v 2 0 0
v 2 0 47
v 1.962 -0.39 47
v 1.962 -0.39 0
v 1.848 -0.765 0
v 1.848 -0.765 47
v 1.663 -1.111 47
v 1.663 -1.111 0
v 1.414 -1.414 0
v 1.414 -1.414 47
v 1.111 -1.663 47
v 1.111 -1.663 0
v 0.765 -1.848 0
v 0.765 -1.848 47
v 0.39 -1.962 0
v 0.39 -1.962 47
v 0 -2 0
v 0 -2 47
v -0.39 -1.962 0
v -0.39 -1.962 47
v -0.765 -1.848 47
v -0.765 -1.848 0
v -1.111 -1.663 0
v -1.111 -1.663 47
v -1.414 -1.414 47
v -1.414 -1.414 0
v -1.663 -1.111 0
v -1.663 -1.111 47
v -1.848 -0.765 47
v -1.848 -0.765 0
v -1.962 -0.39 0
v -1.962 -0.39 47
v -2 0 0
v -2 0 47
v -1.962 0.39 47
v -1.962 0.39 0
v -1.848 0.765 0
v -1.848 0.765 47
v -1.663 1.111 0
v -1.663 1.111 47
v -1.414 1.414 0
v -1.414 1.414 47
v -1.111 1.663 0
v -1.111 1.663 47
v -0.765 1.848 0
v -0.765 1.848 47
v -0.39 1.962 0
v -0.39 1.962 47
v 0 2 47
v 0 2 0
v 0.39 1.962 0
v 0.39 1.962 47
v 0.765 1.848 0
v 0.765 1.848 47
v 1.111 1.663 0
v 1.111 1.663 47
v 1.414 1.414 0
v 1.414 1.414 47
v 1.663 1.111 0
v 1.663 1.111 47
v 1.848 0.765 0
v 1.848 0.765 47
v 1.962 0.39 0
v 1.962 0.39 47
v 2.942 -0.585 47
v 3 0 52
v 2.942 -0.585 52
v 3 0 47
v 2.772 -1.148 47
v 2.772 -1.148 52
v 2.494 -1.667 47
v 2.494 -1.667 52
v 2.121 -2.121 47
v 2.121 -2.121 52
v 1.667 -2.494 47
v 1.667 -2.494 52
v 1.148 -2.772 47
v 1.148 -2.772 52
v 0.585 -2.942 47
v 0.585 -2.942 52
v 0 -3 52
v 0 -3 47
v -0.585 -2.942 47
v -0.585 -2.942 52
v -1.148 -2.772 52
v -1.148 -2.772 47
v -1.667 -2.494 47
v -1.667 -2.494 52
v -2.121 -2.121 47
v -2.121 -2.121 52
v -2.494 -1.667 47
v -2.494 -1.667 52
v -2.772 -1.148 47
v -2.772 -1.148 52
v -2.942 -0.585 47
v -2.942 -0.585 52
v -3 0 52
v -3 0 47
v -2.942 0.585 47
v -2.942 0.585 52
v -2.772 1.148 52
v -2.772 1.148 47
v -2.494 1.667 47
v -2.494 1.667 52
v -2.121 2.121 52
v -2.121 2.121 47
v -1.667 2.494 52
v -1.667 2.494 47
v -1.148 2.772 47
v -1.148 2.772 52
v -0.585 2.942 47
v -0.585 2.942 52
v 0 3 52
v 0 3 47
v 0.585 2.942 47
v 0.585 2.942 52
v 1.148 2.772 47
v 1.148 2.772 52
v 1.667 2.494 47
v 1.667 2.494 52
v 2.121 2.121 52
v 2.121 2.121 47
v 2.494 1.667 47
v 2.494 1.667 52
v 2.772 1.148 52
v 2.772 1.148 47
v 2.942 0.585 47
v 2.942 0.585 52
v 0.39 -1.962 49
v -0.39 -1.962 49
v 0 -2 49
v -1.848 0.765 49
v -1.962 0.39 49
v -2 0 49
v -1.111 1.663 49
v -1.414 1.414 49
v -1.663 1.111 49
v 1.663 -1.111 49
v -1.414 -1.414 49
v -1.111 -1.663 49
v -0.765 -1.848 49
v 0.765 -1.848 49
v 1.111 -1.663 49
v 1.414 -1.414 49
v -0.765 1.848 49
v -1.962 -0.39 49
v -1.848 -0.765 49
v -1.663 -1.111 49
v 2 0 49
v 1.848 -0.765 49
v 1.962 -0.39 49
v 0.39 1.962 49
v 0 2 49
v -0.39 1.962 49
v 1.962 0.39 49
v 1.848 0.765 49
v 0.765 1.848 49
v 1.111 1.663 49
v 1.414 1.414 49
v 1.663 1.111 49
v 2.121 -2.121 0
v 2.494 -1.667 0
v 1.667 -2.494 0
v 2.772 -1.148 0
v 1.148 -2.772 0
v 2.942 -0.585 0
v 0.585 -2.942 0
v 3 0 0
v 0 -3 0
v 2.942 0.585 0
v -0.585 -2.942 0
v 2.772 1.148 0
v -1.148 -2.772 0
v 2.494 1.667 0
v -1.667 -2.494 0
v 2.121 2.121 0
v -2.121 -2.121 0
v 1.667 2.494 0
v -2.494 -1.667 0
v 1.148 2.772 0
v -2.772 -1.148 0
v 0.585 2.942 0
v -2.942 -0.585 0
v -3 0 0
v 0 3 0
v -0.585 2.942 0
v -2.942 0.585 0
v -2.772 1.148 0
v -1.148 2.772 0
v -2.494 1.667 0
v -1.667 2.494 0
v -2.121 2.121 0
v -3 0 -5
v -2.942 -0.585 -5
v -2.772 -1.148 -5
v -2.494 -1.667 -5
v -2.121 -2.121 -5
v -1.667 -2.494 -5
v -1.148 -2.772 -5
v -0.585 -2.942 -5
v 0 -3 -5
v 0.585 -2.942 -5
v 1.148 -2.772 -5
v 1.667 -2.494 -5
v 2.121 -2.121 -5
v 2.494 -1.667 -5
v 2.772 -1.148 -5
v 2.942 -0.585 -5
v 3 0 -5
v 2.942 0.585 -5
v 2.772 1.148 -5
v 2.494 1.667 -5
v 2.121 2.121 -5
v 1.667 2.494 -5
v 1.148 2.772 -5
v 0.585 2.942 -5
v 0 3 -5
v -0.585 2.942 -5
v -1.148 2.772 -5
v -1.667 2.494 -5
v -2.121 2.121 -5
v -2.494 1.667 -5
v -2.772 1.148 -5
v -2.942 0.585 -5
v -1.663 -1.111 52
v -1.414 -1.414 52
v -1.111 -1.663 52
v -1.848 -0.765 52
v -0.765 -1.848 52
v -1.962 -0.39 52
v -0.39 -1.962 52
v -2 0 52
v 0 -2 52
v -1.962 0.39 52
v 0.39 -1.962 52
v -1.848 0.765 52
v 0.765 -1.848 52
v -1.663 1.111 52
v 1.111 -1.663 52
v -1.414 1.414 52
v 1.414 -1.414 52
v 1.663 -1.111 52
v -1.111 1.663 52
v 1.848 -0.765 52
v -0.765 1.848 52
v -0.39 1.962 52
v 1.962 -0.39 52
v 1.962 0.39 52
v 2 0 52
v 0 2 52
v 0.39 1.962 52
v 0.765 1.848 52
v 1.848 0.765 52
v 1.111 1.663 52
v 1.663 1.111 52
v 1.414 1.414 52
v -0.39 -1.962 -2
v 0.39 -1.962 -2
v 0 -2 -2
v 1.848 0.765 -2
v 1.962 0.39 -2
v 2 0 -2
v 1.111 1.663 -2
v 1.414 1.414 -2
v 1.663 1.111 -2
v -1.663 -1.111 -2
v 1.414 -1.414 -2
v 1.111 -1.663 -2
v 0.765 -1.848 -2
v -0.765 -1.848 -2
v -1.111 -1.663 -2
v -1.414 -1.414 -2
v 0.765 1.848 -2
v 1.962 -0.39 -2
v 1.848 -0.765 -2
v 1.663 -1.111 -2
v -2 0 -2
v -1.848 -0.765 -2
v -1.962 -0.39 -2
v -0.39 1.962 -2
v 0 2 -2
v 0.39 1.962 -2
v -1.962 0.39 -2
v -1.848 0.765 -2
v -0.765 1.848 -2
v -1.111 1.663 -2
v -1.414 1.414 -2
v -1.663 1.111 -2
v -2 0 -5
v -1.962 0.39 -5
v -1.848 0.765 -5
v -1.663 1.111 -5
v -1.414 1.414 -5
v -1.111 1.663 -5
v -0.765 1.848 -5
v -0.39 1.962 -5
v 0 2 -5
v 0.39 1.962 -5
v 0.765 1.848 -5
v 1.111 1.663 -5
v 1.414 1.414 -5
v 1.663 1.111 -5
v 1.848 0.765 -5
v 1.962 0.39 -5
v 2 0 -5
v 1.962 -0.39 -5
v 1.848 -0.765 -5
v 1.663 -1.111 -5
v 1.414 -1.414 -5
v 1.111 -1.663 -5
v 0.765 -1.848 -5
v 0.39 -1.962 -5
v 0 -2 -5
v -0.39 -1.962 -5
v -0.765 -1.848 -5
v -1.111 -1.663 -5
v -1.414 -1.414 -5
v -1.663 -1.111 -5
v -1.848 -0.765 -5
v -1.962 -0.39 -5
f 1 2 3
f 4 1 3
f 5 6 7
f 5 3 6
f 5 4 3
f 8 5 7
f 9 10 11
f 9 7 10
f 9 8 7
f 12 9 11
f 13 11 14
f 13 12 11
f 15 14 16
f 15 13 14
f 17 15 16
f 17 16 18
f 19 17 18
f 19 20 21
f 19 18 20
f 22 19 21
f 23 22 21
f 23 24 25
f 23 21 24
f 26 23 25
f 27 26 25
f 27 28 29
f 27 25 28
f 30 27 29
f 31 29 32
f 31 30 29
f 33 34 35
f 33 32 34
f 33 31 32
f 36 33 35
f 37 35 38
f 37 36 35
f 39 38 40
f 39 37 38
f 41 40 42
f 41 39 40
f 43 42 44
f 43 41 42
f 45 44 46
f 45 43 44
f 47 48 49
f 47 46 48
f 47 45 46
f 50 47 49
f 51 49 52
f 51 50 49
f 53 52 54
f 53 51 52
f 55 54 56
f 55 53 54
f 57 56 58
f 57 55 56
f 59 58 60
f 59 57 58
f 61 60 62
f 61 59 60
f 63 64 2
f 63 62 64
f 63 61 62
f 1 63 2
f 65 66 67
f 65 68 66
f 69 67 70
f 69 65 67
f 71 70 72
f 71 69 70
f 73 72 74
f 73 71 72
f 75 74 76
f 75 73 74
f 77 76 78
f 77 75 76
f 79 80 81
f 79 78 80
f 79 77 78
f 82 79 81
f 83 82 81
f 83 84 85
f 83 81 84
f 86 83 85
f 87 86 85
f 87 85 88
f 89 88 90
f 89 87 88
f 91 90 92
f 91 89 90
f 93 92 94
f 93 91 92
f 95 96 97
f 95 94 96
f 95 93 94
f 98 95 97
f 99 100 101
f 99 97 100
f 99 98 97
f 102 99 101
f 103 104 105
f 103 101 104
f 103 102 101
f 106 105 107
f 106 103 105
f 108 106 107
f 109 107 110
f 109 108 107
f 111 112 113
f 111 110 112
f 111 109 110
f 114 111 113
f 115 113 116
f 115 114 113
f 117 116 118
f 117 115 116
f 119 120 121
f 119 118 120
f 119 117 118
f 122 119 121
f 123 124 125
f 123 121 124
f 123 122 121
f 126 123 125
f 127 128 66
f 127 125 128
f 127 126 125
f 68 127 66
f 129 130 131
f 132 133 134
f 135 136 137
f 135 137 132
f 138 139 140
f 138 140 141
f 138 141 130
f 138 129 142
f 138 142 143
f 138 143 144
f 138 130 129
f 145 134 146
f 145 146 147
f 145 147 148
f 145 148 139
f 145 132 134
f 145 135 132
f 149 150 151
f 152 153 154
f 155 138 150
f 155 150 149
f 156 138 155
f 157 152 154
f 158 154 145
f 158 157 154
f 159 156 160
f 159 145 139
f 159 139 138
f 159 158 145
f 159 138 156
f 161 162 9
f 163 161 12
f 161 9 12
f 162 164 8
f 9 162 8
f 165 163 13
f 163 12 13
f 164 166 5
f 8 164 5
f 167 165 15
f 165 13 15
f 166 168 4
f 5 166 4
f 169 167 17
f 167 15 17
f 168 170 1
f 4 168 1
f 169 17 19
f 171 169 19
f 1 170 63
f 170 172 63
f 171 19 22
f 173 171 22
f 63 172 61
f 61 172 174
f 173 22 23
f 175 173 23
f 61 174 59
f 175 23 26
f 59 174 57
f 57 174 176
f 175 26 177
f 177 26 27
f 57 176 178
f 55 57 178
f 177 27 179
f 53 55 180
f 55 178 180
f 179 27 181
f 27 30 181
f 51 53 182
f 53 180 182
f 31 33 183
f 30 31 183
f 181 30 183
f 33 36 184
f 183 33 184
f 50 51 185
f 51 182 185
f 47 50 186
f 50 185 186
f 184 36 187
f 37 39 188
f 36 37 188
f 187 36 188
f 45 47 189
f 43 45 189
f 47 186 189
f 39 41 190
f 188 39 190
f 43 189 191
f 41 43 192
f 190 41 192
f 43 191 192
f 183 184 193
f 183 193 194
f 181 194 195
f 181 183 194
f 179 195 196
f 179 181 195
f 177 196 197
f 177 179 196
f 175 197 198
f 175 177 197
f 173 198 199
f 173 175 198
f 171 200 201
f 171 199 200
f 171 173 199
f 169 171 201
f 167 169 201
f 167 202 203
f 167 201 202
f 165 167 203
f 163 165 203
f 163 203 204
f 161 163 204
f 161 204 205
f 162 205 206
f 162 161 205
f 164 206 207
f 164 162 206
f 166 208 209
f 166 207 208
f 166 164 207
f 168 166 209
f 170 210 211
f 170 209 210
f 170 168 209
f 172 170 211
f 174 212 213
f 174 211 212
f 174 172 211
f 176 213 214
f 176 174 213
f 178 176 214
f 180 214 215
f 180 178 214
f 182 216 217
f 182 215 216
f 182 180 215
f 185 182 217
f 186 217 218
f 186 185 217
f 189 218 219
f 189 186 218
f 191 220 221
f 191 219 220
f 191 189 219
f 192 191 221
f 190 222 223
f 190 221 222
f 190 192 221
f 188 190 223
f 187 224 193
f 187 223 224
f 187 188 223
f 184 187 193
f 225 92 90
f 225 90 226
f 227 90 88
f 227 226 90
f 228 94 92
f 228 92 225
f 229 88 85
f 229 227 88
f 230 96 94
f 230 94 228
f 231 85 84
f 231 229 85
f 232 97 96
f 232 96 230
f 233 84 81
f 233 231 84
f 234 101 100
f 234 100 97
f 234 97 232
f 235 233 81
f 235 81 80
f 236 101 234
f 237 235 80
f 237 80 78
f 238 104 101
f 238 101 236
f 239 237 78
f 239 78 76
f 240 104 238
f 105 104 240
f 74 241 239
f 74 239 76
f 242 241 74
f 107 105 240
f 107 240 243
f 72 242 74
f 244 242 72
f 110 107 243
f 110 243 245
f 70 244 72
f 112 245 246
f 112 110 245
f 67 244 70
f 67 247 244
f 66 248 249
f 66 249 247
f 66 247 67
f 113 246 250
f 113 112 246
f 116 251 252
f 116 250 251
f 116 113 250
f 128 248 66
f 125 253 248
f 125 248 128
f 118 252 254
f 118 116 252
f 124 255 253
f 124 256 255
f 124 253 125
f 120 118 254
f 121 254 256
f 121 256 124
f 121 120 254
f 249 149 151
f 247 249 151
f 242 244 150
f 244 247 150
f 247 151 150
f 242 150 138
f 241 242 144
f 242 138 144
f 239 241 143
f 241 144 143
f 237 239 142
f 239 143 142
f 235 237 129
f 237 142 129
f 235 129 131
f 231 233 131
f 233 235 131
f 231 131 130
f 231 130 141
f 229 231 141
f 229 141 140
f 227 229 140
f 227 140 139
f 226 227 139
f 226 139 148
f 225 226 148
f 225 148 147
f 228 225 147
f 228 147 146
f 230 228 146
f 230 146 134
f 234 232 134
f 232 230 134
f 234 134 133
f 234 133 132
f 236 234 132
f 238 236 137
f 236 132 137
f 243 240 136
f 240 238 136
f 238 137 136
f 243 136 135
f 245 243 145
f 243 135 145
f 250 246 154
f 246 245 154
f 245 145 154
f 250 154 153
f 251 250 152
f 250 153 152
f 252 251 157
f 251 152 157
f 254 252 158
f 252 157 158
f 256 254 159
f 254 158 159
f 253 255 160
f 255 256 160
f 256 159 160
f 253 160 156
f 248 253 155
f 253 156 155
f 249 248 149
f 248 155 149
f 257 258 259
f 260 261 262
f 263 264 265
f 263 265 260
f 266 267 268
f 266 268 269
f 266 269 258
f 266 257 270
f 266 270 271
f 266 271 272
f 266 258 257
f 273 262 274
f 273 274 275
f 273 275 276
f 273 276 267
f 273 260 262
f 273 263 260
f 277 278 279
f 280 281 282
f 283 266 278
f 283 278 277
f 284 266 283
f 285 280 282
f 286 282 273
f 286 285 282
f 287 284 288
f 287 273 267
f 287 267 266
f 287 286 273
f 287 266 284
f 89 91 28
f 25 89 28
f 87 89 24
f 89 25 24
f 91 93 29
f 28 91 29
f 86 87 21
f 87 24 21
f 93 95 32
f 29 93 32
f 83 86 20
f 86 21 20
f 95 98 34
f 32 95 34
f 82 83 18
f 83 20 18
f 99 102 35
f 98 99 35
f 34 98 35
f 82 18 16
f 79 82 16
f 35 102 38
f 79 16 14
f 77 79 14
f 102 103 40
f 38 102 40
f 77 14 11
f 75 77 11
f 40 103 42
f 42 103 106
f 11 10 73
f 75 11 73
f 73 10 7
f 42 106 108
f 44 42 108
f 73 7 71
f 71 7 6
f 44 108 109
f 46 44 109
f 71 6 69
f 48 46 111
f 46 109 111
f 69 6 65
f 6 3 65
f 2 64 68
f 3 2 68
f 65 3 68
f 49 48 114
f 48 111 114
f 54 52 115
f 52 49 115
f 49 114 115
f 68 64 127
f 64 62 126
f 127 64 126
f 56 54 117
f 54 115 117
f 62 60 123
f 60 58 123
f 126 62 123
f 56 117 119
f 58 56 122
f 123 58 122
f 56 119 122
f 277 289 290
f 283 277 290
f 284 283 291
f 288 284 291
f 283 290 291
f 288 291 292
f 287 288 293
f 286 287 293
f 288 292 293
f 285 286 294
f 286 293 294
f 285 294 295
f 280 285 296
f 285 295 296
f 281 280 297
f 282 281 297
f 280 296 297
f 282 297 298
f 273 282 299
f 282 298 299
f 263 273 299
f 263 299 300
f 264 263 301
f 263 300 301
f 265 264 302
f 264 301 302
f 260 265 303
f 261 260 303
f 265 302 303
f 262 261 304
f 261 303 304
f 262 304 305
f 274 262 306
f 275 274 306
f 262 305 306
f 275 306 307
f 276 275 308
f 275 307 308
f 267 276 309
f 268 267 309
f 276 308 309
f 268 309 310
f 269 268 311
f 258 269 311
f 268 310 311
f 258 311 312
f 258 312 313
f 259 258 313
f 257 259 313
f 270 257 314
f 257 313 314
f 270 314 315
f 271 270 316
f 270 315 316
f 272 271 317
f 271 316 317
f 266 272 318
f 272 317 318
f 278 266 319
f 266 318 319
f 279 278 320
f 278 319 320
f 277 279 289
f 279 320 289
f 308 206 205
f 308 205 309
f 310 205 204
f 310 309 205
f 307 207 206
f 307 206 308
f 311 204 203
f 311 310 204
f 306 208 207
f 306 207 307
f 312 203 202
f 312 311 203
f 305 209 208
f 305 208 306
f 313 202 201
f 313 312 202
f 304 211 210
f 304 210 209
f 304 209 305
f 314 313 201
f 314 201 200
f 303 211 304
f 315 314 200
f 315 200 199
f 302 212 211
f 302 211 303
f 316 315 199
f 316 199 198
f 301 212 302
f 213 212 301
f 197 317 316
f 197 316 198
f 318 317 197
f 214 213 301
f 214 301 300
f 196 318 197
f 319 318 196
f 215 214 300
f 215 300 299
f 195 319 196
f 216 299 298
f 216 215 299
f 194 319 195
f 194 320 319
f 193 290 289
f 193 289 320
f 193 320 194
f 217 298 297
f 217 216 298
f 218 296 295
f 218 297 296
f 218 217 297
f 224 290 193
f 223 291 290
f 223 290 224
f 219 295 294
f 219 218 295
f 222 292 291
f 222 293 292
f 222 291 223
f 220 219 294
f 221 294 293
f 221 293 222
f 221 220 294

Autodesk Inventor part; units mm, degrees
ref_plane "YZ Plane" through (0, 0, 0) normal (1, 0, 0) x (0, 1, 0)
ref_plane "XZ Plane" through (0, 0, 0) normal (0, 1, 0) x (-1, 0, 0)
ref_plane "XY Plane" through (0, 0, 0) normal (0, 0, 1) x (1, 0, 0)
sketch "Sketch1" plane through (0, 0, 0) normal (0, 0, 1) x (1, 0, 0)
  circle A0 centre (0, 0) radius 2
  dimension "d0" = 4
extrude "Extrusion1" add sketch "Sketch1" along normal blind 47
sketch "Sketch2" plane through (0, 0, 47) normal (0, 0, 1) x (1, 0, 0)
  circle A0 centre (0, 0) radius 2 projected
  circle A1 centre (0, 0) radius 3
  dimension "d3" = 6
extrude "Extrusion2" add sketch "Sketch2" along normal blind 5
extrude "Extrusion3" add sketch "Sketch2" along normal blind 2 contours A0
sketch "Sketch3" plane through (0, 0, 0) normal (0, 0, -1) x (-1, 0, 0)
  circle A0 centre (0, 0) radius 3
extrude "Extrusion4" add sketch "Sketch3" along normal blind 5
sketch "Sketch4" plane through (0, 0, -5) normal (0, 0, -1) x (-1, 0, 0)
  circle A0 centre (0, 0) radius 2
  dimension "d10" = 4
extrude "Extrusion5" cut sketch "Sketch4" against normal blind 3
properties part number "Fake Bolt" material "Steel"
